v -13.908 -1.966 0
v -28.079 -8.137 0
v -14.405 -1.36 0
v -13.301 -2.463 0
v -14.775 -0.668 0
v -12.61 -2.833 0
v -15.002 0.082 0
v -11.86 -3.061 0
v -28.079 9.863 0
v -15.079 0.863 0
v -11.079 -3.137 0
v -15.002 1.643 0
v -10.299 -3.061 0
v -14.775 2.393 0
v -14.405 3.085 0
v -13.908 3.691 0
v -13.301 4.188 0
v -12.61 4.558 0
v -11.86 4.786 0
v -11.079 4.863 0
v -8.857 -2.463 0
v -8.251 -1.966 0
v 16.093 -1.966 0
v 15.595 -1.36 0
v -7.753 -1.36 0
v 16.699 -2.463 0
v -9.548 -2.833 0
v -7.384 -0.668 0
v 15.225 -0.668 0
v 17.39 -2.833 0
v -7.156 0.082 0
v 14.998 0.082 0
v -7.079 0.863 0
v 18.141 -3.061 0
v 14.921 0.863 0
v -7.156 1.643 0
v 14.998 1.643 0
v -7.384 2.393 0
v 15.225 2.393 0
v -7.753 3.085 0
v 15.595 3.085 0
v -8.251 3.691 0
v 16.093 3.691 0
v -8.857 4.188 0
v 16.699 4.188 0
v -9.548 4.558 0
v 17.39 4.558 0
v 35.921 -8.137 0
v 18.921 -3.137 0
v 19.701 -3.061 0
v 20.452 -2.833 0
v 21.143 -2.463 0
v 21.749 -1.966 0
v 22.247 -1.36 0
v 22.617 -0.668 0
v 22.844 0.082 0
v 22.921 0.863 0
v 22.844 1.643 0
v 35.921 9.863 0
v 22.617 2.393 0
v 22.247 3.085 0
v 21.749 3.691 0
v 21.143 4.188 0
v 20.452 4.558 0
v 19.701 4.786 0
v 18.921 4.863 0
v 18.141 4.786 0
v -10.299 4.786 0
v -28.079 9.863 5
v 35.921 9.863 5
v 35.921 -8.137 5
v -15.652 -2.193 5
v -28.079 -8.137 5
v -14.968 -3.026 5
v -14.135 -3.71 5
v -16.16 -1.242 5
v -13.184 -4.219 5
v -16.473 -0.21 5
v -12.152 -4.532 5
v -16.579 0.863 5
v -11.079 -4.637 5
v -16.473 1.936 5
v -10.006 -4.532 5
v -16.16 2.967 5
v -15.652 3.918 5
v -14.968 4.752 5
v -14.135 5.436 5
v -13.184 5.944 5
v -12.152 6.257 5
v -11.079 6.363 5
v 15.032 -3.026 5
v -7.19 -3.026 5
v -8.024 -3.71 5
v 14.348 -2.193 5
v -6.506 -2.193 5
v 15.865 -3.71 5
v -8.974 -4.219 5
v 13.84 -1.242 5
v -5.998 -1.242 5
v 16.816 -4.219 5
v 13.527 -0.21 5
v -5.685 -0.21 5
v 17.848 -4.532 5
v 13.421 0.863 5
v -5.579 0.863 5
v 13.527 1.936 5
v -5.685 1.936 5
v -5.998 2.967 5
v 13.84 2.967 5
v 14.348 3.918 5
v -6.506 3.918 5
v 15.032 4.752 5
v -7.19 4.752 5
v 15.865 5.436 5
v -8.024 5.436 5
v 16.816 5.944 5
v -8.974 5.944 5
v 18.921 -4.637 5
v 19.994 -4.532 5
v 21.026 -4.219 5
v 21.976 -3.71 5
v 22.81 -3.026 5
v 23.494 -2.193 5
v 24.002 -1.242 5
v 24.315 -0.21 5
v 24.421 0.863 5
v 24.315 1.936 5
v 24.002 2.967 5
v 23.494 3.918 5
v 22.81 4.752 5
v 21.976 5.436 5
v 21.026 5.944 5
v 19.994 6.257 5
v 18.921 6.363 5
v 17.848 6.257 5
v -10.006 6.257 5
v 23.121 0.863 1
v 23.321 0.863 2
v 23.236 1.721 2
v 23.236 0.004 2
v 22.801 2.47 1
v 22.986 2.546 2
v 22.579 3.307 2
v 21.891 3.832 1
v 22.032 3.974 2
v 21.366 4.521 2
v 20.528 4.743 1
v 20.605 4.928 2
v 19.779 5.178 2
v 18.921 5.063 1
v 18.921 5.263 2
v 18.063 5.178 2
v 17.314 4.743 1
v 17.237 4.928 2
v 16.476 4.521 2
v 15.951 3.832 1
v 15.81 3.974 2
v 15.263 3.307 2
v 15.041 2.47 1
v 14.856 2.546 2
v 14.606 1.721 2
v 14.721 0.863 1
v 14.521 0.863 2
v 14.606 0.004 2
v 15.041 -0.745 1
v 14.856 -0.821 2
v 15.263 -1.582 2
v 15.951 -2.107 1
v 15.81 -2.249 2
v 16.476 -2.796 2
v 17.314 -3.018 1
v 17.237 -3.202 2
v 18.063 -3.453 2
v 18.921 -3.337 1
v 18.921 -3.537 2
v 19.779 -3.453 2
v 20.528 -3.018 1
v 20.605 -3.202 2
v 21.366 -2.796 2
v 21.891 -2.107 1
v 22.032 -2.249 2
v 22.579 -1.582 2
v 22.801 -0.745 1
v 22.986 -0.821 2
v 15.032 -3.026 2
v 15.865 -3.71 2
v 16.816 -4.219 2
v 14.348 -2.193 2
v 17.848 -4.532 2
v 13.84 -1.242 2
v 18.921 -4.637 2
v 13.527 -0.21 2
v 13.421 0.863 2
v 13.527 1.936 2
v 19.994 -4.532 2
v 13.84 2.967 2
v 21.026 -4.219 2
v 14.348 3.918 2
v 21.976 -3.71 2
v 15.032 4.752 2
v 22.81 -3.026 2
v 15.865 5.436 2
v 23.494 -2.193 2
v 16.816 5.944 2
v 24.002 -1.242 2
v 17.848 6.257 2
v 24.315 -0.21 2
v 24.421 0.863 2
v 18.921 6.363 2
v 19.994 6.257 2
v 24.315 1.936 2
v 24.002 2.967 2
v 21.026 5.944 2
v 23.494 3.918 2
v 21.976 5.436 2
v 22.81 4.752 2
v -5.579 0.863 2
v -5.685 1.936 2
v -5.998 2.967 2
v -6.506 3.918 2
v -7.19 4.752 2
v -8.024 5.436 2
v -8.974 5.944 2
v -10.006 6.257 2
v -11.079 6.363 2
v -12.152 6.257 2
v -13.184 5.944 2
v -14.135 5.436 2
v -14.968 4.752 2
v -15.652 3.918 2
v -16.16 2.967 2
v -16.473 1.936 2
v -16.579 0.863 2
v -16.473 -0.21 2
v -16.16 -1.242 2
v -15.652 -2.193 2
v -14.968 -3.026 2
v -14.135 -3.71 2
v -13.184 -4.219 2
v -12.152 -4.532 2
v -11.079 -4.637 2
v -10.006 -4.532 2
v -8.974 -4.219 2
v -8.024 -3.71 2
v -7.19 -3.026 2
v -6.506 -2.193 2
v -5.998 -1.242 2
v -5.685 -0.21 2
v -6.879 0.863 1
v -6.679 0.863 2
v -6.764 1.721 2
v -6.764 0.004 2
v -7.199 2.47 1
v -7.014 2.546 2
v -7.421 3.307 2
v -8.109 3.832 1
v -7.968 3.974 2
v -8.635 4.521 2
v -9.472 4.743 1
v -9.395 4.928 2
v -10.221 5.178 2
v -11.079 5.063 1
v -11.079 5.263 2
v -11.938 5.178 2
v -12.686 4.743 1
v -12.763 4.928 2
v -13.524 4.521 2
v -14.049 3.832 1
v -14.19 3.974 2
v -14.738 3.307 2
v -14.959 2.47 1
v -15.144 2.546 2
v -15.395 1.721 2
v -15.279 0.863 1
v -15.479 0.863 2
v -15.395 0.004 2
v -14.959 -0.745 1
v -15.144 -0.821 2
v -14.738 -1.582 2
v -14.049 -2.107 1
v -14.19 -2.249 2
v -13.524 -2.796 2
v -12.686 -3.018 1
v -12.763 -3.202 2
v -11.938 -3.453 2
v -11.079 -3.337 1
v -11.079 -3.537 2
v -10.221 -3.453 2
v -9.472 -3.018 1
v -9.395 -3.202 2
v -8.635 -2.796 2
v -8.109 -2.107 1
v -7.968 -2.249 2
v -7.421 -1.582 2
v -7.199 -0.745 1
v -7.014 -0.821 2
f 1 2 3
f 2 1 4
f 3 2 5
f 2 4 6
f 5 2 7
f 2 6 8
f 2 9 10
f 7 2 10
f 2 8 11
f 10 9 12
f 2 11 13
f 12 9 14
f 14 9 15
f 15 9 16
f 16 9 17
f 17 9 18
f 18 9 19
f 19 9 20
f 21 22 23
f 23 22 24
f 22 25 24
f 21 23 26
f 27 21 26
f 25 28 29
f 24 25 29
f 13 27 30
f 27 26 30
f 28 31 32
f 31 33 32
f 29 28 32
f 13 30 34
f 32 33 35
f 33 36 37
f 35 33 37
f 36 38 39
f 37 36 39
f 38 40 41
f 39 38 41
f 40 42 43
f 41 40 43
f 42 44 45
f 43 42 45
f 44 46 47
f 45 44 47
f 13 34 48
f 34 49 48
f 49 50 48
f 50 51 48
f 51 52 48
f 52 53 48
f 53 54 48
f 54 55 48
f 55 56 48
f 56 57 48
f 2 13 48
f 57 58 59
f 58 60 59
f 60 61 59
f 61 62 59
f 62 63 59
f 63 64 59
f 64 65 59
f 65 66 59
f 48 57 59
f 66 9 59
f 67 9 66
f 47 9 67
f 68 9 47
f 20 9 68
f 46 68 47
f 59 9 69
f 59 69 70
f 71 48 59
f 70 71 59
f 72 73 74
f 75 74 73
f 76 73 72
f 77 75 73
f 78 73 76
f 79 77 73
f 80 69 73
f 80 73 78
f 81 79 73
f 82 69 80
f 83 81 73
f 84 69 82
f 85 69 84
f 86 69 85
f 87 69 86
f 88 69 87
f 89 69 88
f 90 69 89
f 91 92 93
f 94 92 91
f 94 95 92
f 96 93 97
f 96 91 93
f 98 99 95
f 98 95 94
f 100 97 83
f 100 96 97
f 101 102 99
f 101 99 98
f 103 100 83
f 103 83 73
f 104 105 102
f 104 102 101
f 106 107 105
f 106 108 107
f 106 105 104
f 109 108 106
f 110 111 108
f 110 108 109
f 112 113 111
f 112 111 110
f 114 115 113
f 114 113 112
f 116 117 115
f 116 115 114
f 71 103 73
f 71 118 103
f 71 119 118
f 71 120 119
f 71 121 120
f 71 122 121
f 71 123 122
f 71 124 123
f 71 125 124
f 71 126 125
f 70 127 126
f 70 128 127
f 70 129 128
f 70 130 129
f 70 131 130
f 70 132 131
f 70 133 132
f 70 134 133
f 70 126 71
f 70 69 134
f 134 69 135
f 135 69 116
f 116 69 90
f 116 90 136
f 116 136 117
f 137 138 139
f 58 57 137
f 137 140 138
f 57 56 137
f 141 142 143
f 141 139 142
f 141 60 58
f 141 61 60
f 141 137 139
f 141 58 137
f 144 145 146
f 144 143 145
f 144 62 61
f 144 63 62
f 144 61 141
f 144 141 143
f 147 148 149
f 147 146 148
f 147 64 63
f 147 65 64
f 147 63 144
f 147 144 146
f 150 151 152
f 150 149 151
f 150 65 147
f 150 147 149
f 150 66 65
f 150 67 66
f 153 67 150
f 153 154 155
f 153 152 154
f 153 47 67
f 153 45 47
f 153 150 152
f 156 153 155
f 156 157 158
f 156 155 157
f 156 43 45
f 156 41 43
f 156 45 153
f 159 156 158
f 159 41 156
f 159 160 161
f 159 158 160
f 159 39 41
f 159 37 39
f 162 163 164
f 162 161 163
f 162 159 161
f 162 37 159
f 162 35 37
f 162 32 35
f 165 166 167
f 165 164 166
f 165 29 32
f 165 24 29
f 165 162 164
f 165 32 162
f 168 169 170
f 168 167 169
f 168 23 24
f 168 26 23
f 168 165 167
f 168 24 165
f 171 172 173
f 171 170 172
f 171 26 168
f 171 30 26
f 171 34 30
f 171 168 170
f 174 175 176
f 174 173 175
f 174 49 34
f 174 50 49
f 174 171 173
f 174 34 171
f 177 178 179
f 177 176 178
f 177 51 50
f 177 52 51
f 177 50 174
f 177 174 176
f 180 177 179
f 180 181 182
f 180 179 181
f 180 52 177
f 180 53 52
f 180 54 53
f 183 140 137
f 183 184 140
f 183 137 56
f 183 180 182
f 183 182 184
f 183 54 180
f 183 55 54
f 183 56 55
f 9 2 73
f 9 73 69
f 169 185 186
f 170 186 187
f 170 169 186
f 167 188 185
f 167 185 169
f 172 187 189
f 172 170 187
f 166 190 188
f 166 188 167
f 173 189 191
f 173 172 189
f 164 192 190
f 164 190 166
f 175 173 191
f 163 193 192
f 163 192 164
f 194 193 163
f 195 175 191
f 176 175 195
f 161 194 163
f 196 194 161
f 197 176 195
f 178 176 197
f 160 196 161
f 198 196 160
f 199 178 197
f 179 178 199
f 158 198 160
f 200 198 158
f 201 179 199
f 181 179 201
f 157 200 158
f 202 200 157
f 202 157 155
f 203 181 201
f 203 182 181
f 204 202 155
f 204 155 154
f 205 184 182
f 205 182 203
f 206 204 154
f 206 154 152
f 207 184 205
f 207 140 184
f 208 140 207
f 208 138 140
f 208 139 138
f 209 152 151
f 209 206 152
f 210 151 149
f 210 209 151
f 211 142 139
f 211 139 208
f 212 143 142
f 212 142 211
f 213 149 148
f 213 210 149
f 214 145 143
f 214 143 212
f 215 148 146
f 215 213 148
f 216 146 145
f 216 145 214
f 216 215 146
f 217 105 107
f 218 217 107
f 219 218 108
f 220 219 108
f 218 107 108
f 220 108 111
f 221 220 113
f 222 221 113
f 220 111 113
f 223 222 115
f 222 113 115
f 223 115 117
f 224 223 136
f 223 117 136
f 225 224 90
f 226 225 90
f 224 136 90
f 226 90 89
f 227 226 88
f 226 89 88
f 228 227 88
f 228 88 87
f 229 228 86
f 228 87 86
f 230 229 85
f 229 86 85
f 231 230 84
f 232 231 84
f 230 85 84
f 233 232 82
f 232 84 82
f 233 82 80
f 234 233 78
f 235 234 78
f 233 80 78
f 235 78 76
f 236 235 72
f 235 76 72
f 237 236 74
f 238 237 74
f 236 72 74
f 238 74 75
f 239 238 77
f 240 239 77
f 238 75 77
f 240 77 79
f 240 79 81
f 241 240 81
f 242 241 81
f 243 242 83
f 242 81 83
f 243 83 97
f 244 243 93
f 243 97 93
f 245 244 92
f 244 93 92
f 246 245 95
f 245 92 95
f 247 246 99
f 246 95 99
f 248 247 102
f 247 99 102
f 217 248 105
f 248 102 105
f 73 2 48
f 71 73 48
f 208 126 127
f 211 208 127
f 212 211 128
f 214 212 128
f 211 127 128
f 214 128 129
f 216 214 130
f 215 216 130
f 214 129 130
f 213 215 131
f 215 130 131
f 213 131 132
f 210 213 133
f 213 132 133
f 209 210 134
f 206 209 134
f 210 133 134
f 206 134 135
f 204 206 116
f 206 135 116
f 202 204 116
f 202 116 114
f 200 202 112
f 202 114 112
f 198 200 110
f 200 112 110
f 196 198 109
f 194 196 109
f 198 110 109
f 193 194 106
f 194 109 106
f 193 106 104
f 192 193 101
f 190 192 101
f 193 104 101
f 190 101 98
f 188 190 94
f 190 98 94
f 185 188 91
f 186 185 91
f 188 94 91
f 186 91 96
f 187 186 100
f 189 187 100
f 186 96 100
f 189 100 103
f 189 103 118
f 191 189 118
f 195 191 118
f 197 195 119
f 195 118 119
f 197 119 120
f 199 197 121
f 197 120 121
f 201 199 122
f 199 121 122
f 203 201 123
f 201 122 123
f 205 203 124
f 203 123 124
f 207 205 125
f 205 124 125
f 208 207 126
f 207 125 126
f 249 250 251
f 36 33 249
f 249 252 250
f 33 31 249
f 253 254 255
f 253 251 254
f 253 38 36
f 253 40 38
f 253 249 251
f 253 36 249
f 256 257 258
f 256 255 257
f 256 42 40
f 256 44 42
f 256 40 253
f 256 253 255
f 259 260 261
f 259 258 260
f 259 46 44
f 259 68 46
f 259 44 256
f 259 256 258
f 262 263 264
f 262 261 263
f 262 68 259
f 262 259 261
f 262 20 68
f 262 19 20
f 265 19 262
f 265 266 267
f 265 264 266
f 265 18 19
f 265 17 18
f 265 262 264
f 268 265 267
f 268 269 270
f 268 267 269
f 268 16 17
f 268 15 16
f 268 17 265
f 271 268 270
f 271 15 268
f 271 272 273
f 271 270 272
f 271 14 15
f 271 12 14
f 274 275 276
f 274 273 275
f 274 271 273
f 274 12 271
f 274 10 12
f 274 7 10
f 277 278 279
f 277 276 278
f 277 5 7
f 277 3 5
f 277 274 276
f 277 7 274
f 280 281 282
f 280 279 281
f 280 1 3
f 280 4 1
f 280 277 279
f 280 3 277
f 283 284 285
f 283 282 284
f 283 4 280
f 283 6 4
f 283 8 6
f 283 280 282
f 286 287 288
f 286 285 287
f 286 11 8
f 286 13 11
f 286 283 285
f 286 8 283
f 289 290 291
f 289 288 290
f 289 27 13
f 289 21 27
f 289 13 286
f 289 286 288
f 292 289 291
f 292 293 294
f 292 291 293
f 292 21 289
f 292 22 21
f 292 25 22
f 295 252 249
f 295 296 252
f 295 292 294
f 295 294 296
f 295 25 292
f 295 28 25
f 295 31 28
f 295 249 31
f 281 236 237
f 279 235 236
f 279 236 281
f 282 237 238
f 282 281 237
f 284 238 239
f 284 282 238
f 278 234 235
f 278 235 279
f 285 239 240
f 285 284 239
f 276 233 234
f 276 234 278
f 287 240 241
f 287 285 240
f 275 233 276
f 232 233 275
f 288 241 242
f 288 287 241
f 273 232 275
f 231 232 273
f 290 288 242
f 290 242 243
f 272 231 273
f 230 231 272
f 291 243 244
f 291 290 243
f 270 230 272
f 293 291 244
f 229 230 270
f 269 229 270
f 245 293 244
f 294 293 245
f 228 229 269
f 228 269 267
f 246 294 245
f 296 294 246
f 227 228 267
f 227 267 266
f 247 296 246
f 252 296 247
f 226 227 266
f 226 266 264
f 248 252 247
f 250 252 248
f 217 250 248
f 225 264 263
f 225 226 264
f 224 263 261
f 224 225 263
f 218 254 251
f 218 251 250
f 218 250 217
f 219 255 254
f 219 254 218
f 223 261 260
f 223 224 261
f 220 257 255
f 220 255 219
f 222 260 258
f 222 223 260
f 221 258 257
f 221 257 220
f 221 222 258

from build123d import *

# Parameters (mm, degrees)
SKETCH_1_W          = 64
SKETCH_1_H          = 18
SKETCH_1_R          = 3
EXTRUDE_1_DEPTH     = 5
SKETCH_2_R          = 5.5
CUT_EXTRUDE_1_DEPTH = 3


with BuildPart() as part:
    # 草图1 → 凸台-拉伸1 (new body)
    with BuildSketch(Plane.XY):
        with Locations((3.920861217, 0.862610936)):
            Rectangle(SKETCH_1_W, SKETCH_1_H)
        with Locations((-11.079138783, 0.862610936)):
            Circle(SKETCH_1_R, mode=Mode.SUBTRACT)
        with Locations((18.920861217, 0.862610936)):
            Circle(SKETCH_1_R, mode=Mode.SUBTRACT)
    extrude(amount=EXTRUDE_1_DEPTH)

    # 草图2 → 切除-拉伸1 (cut)
    with BuildSketch(Plane.XY.offset(5)):
        with Locations((-11.079138783, 0.862610936)):
            Circle(SKETCH_2_R)
        with Locations((18.920861217, 0.862610936)):
            Circle(SKETCH_2_R)
    extrude(amount=-CUT_EXTRUDE_1_DEPTH, mode=Mode.SUBTRACT)

    # 草图5 → 切除-旋转1 (revolve, cut)
    with BuildSketch(Plane(origin=(0, 0.862610936, 0), x_dir=(1, 0, 0), z_dir=(0, 1, 0))):
        Polygon((-15.079138783, 0), (-16.079138783, -5), (-11.079138783, -5), (-11.079138783, 0), align=None)
    revolve(axis=Axis((-11.079138783, 0.862610936, 0), (0, 0, 1)), mode=Mode.SUBTRACT)

    # 草图5<4> → 切除-旋转2 (revolve, cut)
    with BuildSketch(Plane(origin=(0, 0.862610936, 0), x_dir=(1, 0, 0), z_dir=(0, 1, 0))):
        Polygon((23.920999606, -5), (22.920999606, 0), (18.920999606, 0), (18.920999606, -5), align=None)
    revolve(axis=Axis((18.920999606, 0.862610936, 0), (0, 0, 1)), mode=Mode.SUBTRACT)


solid = part.part
